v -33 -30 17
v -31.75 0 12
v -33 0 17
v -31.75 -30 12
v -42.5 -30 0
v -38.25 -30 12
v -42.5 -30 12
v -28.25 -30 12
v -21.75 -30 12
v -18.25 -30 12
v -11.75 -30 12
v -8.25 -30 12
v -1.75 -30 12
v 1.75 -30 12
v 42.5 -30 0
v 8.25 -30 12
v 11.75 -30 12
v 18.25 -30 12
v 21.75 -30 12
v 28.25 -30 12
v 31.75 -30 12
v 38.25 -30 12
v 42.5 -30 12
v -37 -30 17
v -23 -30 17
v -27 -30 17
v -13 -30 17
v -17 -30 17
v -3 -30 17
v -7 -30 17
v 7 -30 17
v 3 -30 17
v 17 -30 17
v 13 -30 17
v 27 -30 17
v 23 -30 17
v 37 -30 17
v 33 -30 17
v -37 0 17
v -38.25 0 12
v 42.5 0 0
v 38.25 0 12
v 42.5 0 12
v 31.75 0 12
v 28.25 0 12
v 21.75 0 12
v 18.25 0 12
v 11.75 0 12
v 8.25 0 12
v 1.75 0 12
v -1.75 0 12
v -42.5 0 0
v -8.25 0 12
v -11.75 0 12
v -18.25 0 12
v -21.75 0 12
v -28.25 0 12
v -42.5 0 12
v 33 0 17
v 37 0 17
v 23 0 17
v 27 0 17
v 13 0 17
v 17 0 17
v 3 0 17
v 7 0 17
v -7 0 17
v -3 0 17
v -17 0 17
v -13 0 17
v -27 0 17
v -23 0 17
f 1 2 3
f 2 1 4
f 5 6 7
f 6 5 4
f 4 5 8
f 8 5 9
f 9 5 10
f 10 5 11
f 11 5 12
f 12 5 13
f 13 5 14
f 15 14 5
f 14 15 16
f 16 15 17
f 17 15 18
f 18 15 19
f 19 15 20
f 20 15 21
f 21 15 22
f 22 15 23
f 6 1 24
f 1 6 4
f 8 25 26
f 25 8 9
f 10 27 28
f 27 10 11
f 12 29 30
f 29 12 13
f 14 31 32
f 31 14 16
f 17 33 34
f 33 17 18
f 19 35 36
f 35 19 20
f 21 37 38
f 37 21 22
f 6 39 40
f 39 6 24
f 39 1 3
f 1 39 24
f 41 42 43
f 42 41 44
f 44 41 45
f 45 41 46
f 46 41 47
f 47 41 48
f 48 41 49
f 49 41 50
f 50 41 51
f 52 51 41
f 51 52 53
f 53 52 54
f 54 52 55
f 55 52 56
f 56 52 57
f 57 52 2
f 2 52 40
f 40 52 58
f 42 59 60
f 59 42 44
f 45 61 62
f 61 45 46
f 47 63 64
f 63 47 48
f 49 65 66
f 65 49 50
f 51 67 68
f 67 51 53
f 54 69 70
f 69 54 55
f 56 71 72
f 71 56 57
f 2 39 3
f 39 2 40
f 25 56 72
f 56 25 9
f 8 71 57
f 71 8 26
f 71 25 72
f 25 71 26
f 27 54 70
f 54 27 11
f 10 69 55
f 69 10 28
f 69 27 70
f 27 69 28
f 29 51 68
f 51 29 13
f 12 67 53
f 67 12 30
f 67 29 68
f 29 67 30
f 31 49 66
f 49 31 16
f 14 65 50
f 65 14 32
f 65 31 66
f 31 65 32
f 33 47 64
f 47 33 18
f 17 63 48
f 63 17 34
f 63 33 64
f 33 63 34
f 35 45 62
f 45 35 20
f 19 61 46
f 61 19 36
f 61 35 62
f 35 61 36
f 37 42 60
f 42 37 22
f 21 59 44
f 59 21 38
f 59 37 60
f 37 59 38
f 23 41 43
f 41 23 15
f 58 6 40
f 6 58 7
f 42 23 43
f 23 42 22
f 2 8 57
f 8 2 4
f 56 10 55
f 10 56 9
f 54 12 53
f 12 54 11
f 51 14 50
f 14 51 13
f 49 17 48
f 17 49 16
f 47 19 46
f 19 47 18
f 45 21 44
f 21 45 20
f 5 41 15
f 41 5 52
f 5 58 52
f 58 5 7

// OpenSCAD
$fn = 32;

// ----------------------------------------------------------------------
// Toothed rack, 8 teeth
// 10 mm pitch, 5 mm teeth
// ----------------------------------------------------------------------

// --- parameters (mm) ---
bar_w = 30;   // bar width (Y)
bar_h = 12;   // bar height (Z)
teeth = 8;    // number of teeth
pitch = 10;   // tooth pitch
tooth_h = 5;  // tooth height above the bar
root_w = 7;   // tooth width at the root
crest_w = 4;  // tooth width at the crest

// --- derived feature positions (mm) ---
span = (teeth - 1) * pitch;  // = 70   distance between the outer teeth
bar_l = span + root_w + 8;   // = 85   bar length: teeth plus 4 mm at each end
tooth_x = -span / 2;         // = -35   X of the first tooth
height = bar_h + tooth_h;    // = 17   overall height
feature_centers = [
  [tooth_x + 0 * pitch, -bar_w / 2],
  [tooth_x + 1 * pitch, -bar_w / 2],
  [tooth_x + 2 * pitch, -bar_w / 2],
  [tooth_x + 3 * pitch, -bar_w / 2],
  [tooth_x + 4 * pitch, -bar_w / 2],
  [tooth_x + 5 * pitch, -bar_w / 2],
  [tooth_x + 6 * pitch, -bar_w / 2],
  [tooth_x + 7 * pitch, -bar_w / 2]
];   // tooth centre line, drives the tooth loop

// bar with a rack of teeth, one extruded trapezoium per centre
module rack_tooth() {
  linear_extrude(height = bar_w)
    polygon(points = [
      [0, 0],
      [root_w, 0],
      [root_w / 2 + crest_w / 2, tooth_h + 1],
      [root_w / 2 - crest_w / 2, tooth_h + 1]
    ]);
}

union() {
  translate([-bar_l / 2, -bar_w, 0]) cube([bar_l, bar_w, bar_h]);
  for (centre = feature_centers)
    translate([centre[0] - root_w / 2, 0, bar_h - 1]) rotate([90, 0, 0]) rack_tooth();
}
